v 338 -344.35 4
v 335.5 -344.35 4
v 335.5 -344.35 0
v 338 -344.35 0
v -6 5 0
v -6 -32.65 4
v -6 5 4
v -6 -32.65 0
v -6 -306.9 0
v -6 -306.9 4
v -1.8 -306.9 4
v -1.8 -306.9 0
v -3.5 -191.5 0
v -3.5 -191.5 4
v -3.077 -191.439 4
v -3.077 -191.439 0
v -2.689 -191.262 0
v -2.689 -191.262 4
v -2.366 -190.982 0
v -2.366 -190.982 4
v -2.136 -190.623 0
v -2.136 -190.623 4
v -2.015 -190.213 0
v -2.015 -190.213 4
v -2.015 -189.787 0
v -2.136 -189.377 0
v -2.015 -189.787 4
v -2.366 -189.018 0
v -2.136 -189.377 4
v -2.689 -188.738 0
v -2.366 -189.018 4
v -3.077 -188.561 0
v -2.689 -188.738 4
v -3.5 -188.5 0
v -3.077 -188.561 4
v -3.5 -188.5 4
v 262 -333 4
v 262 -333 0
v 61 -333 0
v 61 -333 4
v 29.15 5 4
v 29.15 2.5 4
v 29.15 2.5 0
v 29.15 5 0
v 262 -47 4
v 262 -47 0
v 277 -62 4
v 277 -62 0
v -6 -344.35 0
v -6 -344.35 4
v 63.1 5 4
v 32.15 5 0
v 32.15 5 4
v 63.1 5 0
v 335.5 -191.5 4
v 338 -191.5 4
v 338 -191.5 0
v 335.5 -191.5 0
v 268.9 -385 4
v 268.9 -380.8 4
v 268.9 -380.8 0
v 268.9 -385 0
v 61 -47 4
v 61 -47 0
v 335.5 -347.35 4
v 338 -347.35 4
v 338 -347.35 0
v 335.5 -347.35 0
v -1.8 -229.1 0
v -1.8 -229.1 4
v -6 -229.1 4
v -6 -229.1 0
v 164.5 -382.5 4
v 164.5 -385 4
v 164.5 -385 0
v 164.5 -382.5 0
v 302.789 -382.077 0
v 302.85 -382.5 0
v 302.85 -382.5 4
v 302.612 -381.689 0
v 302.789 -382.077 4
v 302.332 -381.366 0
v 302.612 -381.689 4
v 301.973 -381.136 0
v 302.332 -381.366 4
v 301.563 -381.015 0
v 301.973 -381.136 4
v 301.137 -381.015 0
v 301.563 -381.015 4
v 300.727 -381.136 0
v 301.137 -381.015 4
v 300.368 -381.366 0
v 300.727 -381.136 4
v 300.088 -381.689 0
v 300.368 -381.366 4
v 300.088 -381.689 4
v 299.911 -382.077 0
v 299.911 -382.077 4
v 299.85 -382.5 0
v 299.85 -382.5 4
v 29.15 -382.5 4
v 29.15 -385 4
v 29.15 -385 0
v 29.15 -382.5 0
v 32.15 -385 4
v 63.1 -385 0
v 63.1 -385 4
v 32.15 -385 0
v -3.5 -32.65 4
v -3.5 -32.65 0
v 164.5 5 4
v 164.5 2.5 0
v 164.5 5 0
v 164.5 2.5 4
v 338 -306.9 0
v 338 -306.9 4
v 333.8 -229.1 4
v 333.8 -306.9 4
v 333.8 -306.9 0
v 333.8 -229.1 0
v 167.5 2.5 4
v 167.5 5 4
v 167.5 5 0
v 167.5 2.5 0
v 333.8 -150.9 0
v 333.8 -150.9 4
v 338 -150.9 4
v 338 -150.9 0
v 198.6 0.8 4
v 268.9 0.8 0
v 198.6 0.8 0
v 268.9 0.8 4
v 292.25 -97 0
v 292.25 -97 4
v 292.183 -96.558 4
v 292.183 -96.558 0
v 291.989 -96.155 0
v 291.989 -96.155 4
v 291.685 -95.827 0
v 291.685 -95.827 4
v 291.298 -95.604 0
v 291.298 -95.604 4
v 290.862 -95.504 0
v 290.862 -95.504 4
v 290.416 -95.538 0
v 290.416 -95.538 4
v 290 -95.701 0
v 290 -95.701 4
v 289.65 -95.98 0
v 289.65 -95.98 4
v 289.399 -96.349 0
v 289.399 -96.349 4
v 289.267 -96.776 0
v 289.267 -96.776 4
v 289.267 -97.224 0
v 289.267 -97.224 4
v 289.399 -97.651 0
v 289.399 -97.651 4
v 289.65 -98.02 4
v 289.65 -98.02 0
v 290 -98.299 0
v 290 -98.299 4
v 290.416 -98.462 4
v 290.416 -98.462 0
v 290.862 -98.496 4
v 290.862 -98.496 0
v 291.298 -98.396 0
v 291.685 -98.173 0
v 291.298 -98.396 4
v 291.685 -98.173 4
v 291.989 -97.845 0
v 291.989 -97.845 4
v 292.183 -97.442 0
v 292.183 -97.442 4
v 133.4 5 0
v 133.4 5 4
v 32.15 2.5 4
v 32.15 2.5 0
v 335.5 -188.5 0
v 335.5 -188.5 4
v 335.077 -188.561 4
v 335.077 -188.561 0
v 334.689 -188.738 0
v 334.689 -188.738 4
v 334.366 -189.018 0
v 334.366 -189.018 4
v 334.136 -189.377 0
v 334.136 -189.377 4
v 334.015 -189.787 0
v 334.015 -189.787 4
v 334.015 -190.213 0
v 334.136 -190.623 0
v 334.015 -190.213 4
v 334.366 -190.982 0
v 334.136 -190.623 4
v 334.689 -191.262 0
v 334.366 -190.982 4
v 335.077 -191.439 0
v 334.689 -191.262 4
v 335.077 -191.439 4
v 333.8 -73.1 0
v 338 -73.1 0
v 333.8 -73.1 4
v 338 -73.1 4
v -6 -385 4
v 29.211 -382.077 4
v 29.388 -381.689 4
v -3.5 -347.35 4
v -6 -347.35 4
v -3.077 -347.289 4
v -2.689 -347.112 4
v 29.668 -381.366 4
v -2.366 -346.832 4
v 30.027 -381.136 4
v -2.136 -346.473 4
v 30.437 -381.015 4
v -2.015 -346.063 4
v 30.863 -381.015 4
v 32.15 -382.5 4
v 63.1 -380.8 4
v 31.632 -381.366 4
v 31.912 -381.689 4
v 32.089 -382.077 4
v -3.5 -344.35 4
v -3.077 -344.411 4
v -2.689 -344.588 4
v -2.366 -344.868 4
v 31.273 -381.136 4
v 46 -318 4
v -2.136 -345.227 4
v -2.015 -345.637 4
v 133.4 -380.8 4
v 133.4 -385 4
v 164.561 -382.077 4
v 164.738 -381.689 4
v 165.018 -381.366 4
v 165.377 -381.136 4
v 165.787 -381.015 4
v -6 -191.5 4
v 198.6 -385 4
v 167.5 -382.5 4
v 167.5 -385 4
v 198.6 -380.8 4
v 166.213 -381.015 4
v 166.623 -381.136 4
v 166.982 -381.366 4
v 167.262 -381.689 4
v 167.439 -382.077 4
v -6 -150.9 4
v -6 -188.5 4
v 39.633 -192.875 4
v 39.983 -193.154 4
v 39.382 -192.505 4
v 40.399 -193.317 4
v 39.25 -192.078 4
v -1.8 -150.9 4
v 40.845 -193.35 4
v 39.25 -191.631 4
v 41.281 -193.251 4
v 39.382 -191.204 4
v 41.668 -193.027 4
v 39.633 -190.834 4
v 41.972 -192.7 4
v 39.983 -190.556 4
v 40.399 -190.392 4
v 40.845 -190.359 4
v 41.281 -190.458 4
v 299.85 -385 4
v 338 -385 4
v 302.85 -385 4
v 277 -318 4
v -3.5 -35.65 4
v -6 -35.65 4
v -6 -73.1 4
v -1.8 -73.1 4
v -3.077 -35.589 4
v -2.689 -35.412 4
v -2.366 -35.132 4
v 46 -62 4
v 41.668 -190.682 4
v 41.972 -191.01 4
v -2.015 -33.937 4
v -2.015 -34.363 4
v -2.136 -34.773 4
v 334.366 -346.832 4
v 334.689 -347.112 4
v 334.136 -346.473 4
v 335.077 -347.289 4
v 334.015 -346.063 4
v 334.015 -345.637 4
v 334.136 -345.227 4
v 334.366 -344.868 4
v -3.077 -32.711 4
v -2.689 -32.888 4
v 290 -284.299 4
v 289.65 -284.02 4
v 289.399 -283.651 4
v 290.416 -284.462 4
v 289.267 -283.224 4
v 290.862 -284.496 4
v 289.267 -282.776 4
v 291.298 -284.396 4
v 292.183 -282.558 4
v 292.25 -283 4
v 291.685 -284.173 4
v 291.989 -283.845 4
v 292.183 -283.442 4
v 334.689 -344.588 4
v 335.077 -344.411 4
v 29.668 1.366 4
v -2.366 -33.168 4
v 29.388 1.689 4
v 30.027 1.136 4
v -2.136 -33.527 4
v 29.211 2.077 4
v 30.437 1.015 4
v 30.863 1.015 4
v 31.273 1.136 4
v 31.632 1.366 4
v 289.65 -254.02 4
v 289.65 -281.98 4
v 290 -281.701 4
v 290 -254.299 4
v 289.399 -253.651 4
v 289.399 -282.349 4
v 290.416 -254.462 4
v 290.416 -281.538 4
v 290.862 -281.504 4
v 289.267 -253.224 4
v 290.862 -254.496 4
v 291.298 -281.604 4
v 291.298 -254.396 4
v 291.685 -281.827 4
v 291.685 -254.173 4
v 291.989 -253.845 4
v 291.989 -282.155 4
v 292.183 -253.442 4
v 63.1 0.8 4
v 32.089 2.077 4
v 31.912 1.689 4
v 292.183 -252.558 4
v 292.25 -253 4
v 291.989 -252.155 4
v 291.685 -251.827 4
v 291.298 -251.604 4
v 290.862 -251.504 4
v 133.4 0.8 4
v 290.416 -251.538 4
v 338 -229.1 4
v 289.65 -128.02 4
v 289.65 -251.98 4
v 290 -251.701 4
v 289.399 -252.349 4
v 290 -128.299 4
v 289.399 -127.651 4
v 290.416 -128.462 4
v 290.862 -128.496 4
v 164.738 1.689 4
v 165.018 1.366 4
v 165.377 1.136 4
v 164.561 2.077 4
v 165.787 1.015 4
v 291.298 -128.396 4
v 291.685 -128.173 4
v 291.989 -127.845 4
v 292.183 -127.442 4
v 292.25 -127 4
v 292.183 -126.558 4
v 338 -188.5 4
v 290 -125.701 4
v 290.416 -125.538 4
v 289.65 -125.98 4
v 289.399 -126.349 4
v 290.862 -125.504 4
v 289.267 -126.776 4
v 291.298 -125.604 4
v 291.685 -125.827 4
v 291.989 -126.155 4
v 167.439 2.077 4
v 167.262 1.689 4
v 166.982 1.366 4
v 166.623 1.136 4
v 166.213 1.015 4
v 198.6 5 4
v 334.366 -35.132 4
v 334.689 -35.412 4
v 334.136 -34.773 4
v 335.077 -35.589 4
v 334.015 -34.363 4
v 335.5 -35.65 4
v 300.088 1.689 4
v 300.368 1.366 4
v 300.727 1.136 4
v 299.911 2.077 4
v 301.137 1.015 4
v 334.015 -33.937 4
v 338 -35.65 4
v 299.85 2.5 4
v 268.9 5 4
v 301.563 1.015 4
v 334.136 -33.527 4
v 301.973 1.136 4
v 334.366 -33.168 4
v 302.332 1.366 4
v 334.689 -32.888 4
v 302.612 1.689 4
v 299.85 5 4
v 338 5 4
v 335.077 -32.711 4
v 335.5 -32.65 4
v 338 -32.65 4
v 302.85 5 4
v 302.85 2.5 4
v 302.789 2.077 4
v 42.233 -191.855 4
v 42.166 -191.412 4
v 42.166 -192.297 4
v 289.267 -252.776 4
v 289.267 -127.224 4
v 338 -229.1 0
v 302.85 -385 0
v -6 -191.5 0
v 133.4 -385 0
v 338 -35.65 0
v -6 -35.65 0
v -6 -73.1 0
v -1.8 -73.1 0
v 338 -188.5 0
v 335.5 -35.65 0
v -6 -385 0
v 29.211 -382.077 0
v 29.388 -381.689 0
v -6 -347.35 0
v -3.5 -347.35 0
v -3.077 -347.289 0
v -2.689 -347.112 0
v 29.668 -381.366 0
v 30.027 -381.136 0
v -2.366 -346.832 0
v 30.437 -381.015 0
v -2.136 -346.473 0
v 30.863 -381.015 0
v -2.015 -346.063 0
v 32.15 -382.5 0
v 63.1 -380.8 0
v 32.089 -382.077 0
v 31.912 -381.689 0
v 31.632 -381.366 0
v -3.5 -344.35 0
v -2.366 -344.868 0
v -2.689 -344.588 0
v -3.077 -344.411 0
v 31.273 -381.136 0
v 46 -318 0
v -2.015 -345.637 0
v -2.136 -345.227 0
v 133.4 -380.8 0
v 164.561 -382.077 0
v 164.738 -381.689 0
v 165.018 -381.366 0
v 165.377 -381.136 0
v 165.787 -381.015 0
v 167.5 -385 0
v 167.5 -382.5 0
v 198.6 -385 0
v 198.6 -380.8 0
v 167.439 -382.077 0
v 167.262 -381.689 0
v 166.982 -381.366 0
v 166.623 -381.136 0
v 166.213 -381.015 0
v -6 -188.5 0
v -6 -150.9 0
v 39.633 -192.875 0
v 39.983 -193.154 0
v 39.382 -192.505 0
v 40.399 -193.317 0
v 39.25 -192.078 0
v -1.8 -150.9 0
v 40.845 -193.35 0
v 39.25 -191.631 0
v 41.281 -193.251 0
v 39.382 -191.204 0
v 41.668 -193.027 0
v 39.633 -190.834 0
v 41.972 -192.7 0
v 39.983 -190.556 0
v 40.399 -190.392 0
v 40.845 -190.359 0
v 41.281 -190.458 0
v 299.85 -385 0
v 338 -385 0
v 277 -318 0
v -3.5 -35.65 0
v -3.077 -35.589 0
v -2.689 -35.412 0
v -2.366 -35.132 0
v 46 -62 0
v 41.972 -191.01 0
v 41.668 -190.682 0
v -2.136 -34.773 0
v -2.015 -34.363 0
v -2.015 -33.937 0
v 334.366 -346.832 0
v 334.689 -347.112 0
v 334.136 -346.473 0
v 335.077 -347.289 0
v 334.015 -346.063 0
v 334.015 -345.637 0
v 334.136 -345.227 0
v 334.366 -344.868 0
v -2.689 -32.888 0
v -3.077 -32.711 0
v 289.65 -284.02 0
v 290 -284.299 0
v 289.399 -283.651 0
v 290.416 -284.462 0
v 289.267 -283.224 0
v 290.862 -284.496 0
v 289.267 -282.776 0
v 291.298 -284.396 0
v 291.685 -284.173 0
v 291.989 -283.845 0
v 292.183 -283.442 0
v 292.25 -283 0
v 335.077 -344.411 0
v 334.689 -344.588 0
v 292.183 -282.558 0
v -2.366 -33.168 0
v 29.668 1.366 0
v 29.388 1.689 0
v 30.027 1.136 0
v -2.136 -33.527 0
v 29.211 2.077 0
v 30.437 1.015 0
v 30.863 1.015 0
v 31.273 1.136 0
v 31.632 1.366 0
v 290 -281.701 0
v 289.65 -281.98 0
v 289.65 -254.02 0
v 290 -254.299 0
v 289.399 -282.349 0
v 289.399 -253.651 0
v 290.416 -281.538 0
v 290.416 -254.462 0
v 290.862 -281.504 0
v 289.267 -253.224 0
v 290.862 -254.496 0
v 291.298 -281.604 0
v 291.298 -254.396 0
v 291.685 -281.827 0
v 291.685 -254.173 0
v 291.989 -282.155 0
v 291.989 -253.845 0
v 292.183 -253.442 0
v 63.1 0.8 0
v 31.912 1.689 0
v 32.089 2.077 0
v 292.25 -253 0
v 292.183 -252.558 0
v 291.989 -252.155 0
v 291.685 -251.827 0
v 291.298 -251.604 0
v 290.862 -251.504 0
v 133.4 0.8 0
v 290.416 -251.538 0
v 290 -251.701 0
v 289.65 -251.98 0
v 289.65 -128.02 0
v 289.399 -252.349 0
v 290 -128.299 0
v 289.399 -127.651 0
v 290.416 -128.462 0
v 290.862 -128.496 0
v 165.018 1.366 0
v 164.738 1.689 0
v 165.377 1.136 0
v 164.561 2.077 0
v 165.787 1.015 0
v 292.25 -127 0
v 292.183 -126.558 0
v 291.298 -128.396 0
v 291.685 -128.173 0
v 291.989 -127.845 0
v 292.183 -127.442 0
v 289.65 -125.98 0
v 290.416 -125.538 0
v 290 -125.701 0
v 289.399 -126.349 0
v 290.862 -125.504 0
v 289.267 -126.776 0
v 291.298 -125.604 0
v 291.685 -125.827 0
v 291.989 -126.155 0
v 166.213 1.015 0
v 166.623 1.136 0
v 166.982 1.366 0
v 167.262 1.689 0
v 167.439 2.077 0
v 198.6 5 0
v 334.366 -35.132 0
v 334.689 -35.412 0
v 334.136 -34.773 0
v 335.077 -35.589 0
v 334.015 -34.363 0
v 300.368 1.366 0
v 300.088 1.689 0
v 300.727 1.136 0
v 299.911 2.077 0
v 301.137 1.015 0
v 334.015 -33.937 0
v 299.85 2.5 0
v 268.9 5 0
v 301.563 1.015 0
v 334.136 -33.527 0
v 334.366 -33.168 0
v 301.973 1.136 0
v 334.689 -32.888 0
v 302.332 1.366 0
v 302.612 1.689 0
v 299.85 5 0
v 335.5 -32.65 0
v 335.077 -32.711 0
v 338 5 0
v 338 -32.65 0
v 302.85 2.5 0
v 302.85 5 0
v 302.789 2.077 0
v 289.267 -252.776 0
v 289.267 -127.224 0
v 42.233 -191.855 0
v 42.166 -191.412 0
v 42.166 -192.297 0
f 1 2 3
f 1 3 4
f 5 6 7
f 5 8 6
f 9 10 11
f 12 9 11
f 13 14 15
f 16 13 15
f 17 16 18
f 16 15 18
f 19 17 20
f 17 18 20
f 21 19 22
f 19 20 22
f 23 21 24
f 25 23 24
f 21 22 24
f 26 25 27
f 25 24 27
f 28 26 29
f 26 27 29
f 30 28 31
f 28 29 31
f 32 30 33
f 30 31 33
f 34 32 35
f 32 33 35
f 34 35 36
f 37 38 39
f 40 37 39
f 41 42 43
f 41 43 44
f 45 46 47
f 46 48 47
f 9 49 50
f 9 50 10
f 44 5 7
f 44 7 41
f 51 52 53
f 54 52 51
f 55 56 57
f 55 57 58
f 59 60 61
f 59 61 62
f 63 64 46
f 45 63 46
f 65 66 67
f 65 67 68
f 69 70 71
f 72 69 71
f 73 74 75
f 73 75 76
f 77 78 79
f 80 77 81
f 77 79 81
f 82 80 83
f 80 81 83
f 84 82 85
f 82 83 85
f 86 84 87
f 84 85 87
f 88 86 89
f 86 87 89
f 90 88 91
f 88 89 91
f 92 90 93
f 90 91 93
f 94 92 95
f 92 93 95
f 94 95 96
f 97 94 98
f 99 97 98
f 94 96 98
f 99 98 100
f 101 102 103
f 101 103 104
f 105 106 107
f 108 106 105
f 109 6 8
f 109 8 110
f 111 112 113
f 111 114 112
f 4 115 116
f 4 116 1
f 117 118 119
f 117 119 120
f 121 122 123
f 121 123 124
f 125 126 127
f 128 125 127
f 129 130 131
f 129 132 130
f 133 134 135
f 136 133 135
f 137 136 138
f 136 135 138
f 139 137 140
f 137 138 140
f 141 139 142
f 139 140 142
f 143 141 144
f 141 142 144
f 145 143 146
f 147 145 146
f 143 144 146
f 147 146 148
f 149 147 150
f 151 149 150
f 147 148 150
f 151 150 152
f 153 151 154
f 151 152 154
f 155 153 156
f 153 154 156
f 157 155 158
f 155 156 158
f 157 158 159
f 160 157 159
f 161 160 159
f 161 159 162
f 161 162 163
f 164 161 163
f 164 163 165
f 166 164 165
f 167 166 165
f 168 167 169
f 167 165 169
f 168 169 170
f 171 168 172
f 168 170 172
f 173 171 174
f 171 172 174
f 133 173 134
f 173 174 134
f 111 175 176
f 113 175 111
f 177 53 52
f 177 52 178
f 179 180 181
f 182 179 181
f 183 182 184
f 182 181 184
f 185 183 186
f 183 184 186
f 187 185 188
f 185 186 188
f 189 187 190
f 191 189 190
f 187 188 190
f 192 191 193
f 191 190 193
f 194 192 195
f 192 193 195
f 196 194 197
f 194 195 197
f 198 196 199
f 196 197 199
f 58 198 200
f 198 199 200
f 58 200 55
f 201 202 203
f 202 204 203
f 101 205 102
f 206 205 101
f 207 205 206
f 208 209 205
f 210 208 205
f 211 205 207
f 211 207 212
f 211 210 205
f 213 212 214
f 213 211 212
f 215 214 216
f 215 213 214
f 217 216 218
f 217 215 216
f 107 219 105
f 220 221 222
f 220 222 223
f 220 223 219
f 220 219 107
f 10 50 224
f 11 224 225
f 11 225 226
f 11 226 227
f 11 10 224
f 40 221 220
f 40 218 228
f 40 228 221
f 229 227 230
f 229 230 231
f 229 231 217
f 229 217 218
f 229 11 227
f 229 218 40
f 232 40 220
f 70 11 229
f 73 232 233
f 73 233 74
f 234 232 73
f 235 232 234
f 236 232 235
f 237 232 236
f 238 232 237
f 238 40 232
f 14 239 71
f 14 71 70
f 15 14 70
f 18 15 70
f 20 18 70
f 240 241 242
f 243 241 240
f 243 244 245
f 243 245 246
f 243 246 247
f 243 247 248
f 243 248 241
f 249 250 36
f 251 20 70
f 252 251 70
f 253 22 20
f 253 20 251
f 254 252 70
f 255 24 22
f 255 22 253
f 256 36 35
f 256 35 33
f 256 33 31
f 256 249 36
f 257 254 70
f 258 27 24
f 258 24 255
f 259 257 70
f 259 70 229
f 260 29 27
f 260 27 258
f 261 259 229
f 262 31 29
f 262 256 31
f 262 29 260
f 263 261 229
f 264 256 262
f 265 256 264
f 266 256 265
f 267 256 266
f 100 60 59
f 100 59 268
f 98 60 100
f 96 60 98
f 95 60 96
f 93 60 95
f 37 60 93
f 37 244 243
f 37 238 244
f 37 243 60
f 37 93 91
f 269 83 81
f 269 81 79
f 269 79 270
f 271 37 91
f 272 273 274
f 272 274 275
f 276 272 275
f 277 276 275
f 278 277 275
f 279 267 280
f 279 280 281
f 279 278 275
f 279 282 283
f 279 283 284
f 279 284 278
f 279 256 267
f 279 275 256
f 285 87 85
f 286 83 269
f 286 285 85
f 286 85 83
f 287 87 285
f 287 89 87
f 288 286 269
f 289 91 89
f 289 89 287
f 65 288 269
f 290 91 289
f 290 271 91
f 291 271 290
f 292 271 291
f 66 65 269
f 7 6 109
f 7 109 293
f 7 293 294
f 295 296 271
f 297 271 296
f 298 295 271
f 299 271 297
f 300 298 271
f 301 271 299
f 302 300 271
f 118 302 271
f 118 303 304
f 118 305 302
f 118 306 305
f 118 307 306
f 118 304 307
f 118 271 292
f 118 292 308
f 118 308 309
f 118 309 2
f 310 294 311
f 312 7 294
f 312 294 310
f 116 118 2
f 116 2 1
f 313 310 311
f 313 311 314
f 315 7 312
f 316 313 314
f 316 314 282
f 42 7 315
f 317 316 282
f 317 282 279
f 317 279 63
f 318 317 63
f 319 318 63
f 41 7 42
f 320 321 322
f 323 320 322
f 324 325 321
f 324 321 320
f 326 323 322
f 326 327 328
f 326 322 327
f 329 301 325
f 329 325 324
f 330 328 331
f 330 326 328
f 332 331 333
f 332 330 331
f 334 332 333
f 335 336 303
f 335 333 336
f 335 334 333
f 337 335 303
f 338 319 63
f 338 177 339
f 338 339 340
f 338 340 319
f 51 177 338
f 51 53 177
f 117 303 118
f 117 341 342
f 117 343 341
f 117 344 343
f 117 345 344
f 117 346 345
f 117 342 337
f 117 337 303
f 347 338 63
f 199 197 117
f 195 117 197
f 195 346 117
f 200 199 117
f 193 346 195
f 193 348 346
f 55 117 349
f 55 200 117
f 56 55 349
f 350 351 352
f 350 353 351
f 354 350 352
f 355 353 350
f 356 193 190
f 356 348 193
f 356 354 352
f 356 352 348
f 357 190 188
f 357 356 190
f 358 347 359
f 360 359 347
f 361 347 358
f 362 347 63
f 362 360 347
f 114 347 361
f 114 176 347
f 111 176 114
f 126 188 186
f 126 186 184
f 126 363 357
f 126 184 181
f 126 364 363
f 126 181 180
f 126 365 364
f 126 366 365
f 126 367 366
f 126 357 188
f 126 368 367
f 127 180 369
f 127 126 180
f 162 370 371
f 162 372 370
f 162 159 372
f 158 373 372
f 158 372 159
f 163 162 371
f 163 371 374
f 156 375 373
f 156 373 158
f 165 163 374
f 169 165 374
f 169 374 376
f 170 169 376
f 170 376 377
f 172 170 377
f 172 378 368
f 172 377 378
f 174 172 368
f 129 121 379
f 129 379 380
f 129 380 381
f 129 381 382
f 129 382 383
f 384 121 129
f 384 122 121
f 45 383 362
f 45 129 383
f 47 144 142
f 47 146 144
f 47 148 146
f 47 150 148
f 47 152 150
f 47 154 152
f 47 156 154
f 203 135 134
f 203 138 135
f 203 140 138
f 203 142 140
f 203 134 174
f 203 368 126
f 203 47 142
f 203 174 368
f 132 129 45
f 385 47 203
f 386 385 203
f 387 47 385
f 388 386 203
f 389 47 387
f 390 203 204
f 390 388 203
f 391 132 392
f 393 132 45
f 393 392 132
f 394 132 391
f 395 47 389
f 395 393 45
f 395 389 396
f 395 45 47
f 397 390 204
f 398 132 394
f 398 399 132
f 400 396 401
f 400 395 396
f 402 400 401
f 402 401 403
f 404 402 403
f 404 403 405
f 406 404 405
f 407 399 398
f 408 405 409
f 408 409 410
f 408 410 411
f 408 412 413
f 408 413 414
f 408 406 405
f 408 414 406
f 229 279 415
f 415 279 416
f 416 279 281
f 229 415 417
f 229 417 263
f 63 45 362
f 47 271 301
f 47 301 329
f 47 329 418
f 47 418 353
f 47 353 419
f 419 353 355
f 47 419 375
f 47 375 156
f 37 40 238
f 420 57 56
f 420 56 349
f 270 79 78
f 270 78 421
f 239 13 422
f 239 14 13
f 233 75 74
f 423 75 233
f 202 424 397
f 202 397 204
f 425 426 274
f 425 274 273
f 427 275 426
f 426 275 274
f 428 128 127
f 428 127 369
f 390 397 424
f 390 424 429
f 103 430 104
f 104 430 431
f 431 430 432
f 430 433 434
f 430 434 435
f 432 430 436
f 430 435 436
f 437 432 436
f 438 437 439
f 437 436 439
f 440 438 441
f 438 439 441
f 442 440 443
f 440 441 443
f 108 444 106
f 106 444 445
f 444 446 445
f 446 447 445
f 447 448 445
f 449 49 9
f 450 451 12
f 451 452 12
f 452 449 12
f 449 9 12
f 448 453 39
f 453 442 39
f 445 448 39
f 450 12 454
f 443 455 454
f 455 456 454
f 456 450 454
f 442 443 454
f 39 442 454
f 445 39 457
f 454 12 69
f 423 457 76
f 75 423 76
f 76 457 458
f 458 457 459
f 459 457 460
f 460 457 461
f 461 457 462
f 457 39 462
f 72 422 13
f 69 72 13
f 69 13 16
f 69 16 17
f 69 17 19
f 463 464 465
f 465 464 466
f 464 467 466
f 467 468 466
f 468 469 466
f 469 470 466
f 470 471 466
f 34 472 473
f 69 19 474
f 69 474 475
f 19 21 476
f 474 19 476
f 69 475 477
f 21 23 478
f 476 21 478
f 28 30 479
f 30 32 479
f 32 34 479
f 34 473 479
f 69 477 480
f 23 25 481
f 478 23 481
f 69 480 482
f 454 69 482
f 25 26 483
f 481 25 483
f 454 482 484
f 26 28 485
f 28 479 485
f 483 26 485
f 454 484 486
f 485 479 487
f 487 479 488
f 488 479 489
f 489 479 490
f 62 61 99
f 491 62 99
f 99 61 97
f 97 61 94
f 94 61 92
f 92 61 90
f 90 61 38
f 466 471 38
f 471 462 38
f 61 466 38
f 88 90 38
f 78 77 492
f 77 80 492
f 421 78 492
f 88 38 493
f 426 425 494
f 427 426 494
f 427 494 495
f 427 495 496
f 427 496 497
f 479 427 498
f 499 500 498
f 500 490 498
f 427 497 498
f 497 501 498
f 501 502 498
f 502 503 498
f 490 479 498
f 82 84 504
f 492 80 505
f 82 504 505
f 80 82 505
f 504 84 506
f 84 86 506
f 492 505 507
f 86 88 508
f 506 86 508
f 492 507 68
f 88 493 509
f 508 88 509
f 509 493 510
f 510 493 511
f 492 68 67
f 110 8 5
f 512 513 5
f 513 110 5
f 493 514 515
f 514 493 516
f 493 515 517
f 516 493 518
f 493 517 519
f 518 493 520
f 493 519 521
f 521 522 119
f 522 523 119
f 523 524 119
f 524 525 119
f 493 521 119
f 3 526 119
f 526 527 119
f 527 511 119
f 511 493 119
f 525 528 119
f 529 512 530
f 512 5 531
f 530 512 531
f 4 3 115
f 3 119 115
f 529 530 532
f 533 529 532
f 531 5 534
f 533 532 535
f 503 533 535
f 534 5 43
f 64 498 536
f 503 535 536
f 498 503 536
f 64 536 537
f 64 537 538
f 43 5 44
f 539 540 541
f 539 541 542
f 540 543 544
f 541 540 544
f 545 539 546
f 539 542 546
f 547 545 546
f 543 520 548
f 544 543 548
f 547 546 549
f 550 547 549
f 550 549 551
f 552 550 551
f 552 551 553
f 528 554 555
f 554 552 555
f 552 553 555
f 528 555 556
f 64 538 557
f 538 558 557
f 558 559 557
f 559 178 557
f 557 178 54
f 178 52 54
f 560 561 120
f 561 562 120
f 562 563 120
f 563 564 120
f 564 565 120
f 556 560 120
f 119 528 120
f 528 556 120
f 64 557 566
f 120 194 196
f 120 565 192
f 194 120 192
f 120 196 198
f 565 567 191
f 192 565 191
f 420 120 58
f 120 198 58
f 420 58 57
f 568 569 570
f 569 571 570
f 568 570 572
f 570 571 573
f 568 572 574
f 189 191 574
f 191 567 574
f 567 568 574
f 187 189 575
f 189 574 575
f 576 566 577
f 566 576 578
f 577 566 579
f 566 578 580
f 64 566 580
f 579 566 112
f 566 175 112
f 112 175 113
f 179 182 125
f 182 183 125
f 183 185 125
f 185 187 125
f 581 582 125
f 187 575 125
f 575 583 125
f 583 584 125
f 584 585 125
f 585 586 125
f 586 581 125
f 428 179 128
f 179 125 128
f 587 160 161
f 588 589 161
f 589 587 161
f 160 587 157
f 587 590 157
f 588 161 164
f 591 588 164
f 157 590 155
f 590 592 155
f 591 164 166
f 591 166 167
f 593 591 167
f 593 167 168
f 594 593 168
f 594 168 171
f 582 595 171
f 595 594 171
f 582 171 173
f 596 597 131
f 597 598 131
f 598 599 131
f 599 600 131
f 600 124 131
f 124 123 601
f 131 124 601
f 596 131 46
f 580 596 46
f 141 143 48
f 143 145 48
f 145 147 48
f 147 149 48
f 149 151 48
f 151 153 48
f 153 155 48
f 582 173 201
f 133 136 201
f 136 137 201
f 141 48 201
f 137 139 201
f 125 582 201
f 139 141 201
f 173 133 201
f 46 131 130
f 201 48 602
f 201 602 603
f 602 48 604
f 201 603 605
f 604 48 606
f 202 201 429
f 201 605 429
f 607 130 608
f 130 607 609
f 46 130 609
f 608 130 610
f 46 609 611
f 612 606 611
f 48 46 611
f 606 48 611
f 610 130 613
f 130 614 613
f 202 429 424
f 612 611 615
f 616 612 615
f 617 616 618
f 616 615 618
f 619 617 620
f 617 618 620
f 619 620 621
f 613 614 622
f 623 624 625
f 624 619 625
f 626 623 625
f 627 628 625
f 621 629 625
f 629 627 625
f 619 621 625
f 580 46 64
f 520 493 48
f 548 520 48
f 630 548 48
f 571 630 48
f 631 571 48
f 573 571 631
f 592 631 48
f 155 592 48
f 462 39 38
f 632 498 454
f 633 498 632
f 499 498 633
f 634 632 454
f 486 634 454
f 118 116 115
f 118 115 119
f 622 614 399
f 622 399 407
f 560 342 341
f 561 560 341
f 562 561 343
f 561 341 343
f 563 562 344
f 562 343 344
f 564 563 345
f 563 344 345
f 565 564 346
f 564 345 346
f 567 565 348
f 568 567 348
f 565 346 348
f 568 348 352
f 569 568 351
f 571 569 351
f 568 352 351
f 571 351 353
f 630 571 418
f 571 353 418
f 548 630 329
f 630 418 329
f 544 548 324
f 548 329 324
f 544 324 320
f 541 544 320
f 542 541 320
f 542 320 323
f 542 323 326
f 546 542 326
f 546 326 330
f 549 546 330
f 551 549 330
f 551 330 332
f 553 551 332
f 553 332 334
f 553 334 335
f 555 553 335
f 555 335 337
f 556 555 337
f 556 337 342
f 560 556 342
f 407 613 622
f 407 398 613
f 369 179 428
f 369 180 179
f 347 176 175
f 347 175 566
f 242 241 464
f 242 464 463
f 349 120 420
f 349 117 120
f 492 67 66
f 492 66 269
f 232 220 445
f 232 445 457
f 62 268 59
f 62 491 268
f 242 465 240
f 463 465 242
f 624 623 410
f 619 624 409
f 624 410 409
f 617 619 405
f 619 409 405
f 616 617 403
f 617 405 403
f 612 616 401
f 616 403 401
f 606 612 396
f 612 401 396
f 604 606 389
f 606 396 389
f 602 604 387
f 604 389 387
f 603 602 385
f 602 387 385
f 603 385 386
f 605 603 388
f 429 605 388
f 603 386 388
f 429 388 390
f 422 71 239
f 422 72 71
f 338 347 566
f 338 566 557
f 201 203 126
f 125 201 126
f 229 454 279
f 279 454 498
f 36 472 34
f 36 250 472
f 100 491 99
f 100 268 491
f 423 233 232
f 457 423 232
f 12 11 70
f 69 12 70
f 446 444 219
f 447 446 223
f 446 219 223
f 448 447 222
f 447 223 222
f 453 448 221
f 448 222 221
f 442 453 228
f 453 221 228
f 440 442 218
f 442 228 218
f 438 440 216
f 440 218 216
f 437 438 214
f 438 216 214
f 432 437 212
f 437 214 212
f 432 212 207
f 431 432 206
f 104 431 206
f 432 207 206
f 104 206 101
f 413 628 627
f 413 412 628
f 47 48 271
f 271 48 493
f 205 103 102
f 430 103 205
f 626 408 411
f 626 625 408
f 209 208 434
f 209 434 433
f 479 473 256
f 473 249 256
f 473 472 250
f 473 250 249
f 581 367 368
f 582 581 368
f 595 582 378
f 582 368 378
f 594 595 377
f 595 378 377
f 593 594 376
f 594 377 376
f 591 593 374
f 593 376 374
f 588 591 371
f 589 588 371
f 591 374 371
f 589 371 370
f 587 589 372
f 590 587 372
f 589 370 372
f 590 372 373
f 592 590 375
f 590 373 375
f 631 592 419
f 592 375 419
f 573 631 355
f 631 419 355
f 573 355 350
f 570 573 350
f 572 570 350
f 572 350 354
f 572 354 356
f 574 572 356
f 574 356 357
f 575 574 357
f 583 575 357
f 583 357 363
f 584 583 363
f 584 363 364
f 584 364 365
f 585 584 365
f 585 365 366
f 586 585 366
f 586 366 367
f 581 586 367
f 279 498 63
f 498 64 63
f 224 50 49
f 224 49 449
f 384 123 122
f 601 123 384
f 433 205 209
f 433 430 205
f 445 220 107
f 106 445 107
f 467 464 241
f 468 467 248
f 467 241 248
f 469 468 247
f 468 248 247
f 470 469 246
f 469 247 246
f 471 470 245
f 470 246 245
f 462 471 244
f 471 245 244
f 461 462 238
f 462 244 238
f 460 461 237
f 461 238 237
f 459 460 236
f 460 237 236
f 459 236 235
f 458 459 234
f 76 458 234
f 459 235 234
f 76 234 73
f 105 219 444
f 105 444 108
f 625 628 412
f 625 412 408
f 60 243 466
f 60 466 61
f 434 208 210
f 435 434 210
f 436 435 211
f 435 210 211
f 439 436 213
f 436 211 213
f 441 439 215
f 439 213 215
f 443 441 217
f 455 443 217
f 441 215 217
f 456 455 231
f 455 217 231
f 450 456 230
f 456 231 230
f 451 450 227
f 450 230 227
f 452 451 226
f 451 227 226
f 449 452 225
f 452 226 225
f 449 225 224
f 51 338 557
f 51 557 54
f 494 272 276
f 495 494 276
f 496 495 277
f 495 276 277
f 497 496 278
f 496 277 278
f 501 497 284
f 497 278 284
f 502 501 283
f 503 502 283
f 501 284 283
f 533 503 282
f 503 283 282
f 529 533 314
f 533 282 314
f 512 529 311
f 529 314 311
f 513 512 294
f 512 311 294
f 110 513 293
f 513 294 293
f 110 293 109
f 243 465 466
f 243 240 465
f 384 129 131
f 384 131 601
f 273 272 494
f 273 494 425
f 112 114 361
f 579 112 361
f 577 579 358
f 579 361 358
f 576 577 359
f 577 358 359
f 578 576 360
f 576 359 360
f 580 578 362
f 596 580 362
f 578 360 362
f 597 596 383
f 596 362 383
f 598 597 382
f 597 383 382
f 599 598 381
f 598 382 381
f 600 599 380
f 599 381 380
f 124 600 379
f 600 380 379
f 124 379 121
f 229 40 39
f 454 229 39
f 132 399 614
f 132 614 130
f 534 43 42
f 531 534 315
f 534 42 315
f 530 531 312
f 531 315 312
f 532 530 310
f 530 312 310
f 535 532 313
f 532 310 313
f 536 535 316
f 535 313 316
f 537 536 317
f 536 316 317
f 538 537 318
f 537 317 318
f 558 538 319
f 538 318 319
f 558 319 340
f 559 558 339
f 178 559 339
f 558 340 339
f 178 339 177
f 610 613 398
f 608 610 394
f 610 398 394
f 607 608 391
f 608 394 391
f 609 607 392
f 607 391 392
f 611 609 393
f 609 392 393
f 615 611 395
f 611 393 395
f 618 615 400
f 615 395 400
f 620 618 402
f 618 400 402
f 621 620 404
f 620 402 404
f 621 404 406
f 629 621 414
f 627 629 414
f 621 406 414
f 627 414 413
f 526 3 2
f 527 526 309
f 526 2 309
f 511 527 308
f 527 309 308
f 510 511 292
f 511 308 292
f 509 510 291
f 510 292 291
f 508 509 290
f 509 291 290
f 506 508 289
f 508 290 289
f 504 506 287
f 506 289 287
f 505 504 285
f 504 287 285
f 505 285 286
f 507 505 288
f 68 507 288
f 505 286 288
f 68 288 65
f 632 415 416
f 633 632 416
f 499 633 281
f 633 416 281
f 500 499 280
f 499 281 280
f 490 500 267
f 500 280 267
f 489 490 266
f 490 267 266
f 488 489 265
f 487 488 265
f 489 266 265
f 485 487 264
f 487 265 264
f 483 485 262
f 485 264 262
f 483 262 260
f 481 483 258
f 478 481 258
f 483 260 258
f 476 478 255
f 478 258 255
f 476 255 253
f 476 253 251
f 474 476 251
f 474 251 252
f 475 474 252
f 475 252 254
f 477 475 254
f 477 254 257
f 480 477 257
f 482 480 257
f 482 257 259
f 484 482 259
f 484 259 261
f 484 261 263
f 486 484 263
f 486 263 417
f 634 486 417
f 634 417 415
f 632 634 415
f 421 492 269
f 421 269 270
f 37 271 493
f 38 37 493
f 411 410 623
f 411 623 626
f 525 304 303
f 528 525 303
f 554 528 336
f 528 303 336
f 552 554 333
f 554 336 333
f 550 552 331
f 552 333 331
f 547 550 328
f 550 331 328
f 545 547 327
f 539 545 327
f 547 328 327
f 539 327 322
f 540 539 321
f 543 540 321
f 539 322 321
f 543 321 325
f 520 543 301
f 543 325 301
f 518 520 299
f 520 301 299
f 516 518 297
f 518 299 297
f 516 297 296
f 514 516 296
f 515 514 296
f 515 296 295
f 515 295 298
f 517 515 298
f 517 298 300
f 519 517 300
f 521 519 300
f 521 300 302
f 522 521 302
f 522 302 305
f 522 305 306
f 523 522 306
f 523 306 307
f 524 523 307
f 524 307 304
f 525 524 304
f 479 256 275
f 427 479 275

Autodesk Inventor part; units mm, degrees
ref_plane "YZ Plane" through (0, 0, 0) normal (1, 0, 0) x (0, 1, 0)
ref_plane "XZ Plane" through (0, 0, 0) normal (0, 1, 0) x (-1, 0, 0)
ref_plane "XY Plane" through (0, 0, 0) normal (0, 0, 1) x (1, 0, 0)
sketch "Эскиз1" plane through (0, 0, 0) normal (0, 0, 1) x (1, 0, 0)
  line L0 (46, -47) -> (277, -47)
  line L1 (277, -47) -> (277, -333)
  line L2 (277, -333) -> (46, -333)
  line L3 (46, -333) -> (46, -47)
  line L4 (-2, 5) -> (334, 5) projected
  line L5 (338, 5) -> (338, -385) projected
  line L6 (334, -385) -> (-2, -385) projected
  line L7 (-6, -385) -> (-6, 5) projected
  line L8 (-6, 5) -> (338, 5)
  line L9 (338, 5) -> (338, -385)
  line L10 (338, -385) -> (-6, -385)
  line L11 (-6, -385) -> (-6, 5)
  dimension "d4" = 231
  dimension "d10" = 61
  dimension "d11" = 52
  dimension "d12" = 52
  dimension "d13" = 52
extrude "Выдавливание3" add sketch "Эскиз1" along normal blind 4
sketch "Эскиз3" plane through (0, 0, 4) normal (0, 0, 1) x (1, 0, 0)
  circle A0 centre (290.75, -97) radius 1.5
  circle A1 centre (290.75, -127) radius 1.5
  line L0 (46, -47) -> (277, -47) projected
  line L1 (277, -47) -> (277, -333) projected
  circle A2 centre (290.75, -253) radius 1.5
  circle A3 centre (290.75, -283) radius 1.5
  line L2 (277, -333) -> (46, -333) projected
  point P0 (0, 0)
  dimension "d19" = 3
  dimension "d20" = 3
  dimension "d21" = 30
  dimension "d22" = 50
  dimension "d23" = 13.75
  dimension "d24" = 13.75
  dimension "d25" = 3
  dimension "d26" = 3
  dimension "d27" = 30
  dimension "d28" = 13.75
  dimension "d29" = 13.75
  dimension "d30" = 50
extrude "Выдавливание4" cut sketch "Эскиз3" against normal blind 10
chamfer "Фаска1" distance 15 angle 45 4 edges at (277, -47, 2) (277, -333, 2) (46, -47, 2) (46, -333, 2)
sketch "Эскиз4" plane through (0, 0, 4) normal (0, 0, 1) x (1, 0, 0)
  ellipse E0 centre (40.9735, -191.8546) end of major axis (40.9735, -190.3546) minor radius 1.4997 projected
  line L0 (40.9735, -191.8546) -> (10.6659, -191.8546) construction
  circle A0 centre (40.733, -191.8546) radius 1.5
  line L1 (46, -62) -> (46, -318) projected
  point P0 (0, 0)
  dimension "d36" = 3
  dimension "d37" = 5.267
extrude "Выдавливание5" cut sketch "Эскиз4" against normal blind 10 contours A0 E0 | E0 A0 picked at (41.2979, -191.9775) picked at (39.4227, -191.6148)
sketch "Эскиз5" plane through (0, 0, 4) normal (0, 0, 1) x (1, 0, 0)
  line L0 (-6, -73.3) -> (-2, -73.3) projected
  line L1 (-6, -150.7) -> (-2, -150.7) projected
  line L2 (-2, -73.3) -> (-2, -150.7) projected
  line L3 (-6, 5) -> (-6, -385) projected
  line L4 (-6, -229.3) -> (-2, -229.3) projected
  line L5 (-2, -229.3) -> (-2, -306.7) projected
  line L6 (-6, -306.7) -> (-2, -306.7) projected
  line L7 (63.3, -385) -> (63.3, -381) projected
  line L8 (133.2, -385) -> (63.3, -385) projected
  line L9 (133.2, -385) -> (133.2, -381) projected
  line L10 (63.3, -381) -> (133.2, -381) projected
  line L11 (63.3, -385) -> (63.3, -381) projected
  line L12 (268.7, -385) -> (198.8, -385) projected
  line L13 (268.7, -385) -> (268.7, -381) projected
  line L14 (198.8, -381) -> (268.7, -381) projected
  line L15 (198.8, -385) -> (198.8, -381) projected
  line L16 (63.3, 5) -> (133.2, 5) projected
  line L17 (63.3, 5) -> (63.3, 1) projected
  line L18 (133.2, 1) -> (63.3, 1) projected
  line L19 (133.2, 5) -> (133.2, 1) projected
  line L20 (198.8, 5) -> (268.7, 5) projected
  line L21 (198.8, 5) -> (198.8, 1) projected
  line L22 (268.7, 1) -> (198.8, 1) projected
  line L23 (268.7, 5) -> (268.7, 1) projected
  line L24 (338, -229.3) -> (334, -229.3) projected
  line L25 (334, -306.7) -> (334, -229.3) projected
  line L26 (338, -306.7) -> (334, -306.7) projected
  line L27 (338, -229.3) -> (338, -306.7) projected
  line L28 (338, -150.7) -> (334, -150.7) projected
  line L29 (338, -73.3) -> (338, -150.7) projected
  line L30 (334, -150.7) -> (334, -73.3) projected
  line L31 (338, -73.3) -> (334, -73.3) projected
  line L32 (63.1, 0.8) -> (63.1, 5.2)
  line L33 (63.1, 5.2) -> (133.4, 5.2)
  line L34 (133.4, 5.2) -> (133.4, 0.8)
  line L35 (133.4, 0.8) -> (63.1, 0.8)
  line L36 (198.6, 0.8) -> (198.6, 5.2)
  line L37 (198.6, 5.2) -> (268.9, 5.2)
  line L38 (268.9, 5.2) -> (268.9, 0.8)
  line L39 (268.9, 0.8) -> (198.6, 0.8)
  line L40 (333.8, -73.1) -> (333.8, -150.9)
  line L41 (333.8, -150.9) -> (338.2, -150.9)
  line L42 (338.2, -150.9) -> (338.2, -73.1)
  line L43 (338.2, -73.1) -> (333.8, -73.1)
  line L44 (333.8, -229.1) -> (338.2, -229.1)
  line L45 (338.2, -229.1) -> (338.2, -306.9)
  line L46 (338.2, -306.9) -> (333.8, -306.9)
  line L47 (333.8, -306.9) -> (333.8, -229.1)
  line L48 (268.9, -380.8) -> (268.9, -385.2)
  line L49 (268.9, -385.2) -> (198.6, -385.2)
  line L50 (198.6, -385.2) -> (198.6, -380.8)
  line L51 (198.6, -380.8) -> (268.9, -380.8)
  line L52 (133.2, -385) -> (63.3, -385) projected
  line L53 (133.2, -385) -> (133.2, -381) projected
  line L54 (63.3, -381) -> (133.2, -381) projected
  line L55 (63.3, -385) -> (63.3, -381) projected
  line L56 (63.3, -385) -> (63.3, -381) projected
  line L57 (63.3, -381) -> (133.2, -381) projected
  line L58 (-6, -306.9) -> (-1.8, -306.9)
  line L59 (-1.8, -306.9) -> (-1.8, -229.1)
  line L60 (-1.8, -229.1) -> (-6, -229.1)
  line L61 (-6, -150.9) -> (-1.8, -150.9)
  line L62 (-1.8, -150.9) -> (-1.8, -73.1)
  line L63 (-1.8, -73.1) -> (-6, -73.1)
  line L64 (-6, -73.1) -> (-6, -150.9)
  line L65 (-6, -229.1) -> (-6, -306.9)
  line L66 (63.3, -381) -> (133.2, -381)
  line L67 (133.2, -381) -> (133.2, -385)
  line L68 (133.2, -385) -> (63.3, -385)
  line L69 (63.3, -385) -> (63.3, -381)
  line L70 (63.3, -380.8) -> (133.2, -380.8)
  line L71 (63.1, -385) -> (63.1, -381)
  line L72 (133.4, -385) -> (133.4, -381)
  line L73 (133.4, -380.8) -> (63.1, -380.8)
  line L74 (63.1, -380.8) -> (63.1, -385.2)
  line L75 (63.1, -385.2) -> (133.4, -385.2)
  line L76 (133.4, -385.2) -> (133.4, -380.8)
  point P0 (0, 0)
  dimension "d40" = 4
  dimension "d41" = 69.9
  dimension "d42" = 69.9
  dimension "d43" = 0.2
  dimension "d44" = 0.2
  dimension "d45" = 0.2
  dimension "d46" = 0.2
  dimension "d47" = 0.2
  dimension "d48" = 0.2
  dimension "d49" = 0.2
  dimension "d50" = 0.2
  dimension "d51" = 0.2
  dimension "d52" = 0.2
extrude "Выдавливание6" cut sketch "Эскиз5" against normal blind 4.2 contours L3 L63 L62 L61 L1 L2 L0 | L60 L59 L58 L3 L6 L5 L4 | L0 L2 L1 L3 | L4 L5 L6 L3 | L7 L10 L9 L8 | L12 L15 L14 L13 | L16 L19 L18 L17 | L20 L23 L22 L21 | L27 L26 L25 L24 | L28 L30 L31 L29 | L32 L33 L34 L35 | L36 L37 L38 L39 | L43 L42 L41 L40 | L44 L45 L46 L47 | L48 L49 L50 L51 | L70 L73 L76 L72 L75 L74 L71
sketch "Эскиз6" plane through (0, 0, 4) normal (0, 0, 1) x (1, 0, 0)
  line L0 (302.85, -381) -> (302.85, -385) projected
  line L1 (299.85, -385) -> (299.85, -381) projected
  line L2 (167.5, -381) -> (167.5, -385) projected
  line L3 (164.5, -385) -> (164.5, -381) projected
  line L4 (32.15, -381) -> (32.15, -385) projected
  line L5 (29.15, -385) -> (29.15, -381) projected
  line L6 (301.35, -381) -> (301.35, -381)
  line L7 (166, -381) -> (166, -381)
  line L8 (30.65, -381) -> (30.65, -381)
  line L9 (63.1, -380.8) -> (133.4, -380.8) projected
  line L10 (302.85, -381) -> (299.85, -381)
  line L11 (299.85, -382.5) -> (299.85, -385)
  line L12 (299.85, -385) -> (302.85, -385)
  line L13 (302.85, -385) -> (302.85, -382.5)
  line L14 (167.5, -381) -> (164.5, -381)
  line L15 (164.5, -382.5) -> (164.5, -385)
  line L16 (164.5, -385) -> (167.5, -385)
  line L17 (167.5, -385) -> (167.5, -382.5)
  line L18 (32.15, -381) -> (29.15, -381)
  line L19 (29.15, -382.5) -> (29.15, -385)
  line L20 (29.15, -385) -> (32.15, -385)
  line L21 (32.15, -385) -> (32.15, -382.5)
  line L22 (334, -344.35) -> (338, -344.35) projected
  line L23 (338, -347.35) -> (334, -347.35) projected
  line L24 (334, -188.5) -> (338, -188.5) projected
  line L25 (338, -191.5) -> (334, -191.5) projected
  line L26 (334, -32.65) -> (338, -32.65) projected
  line L27 (338, -35.65) -> (334, -35.65) projected
  line L28 (302.85, 5) -> (302.85, 1) projected
  line L29 (299.85, 1) -> (299.85, 5) projected
  line L30 (167.5, 5) -> (167.5, 1) projected
  line L31 (164.5, 1) -> (164.5, 5) projected
  line L32 (32.15, 5) -> (32.15, 1) projected
  line L33 (29.15, 1) -> (29.15, 5) projected
  line L34 (-6, -32.65) -> (-2, -32.65) projected
  line L35 (-2, -35.65) -> (-6, -35.65) projected
  line L36 (-6, -188.5) -> (-2, -188.5) projected
  line L37 (-2, -191.5) -> (-6, -191.5) projected
  line L38 (-6, -344.35) -> (-2, -344.35) projected
  line L39 (-2, -347.35) -> (-6, -347.35) projected
  line L40 (338, -344.35) -> (335.5, -344.35)
  line L41 (334, -345.85) -> (334, -345.85)
  line L42 (335.5, -347.35) -> (338, -347.35)
  line L43 (338, -347.35) -> (338, -344.35)
  line L44 (338, -188.5) -> (335.5, -188.5)
  line L45 (334, -190) -> (334, -190)
  line L46 (335.5, -191.5) -> (338, -191.5)
  line L47 (338, -191.5) -> (338, -188.5)
  line L48 (338, -32.65) -> (335.5, -32.65)
  line L49 (334, -34.15) -> (334, -34.15)
  line L50 (335.5, -35.65) -> (338, -35.65)
  line L51 (338, -35.65) -> (338, -32.65)
  line L52 (302.85, 5) -> (299.85, 5)
  line L53 (299.85, 5) -> (299.85, 2.5)
  line L54 (301.35, 1) -> (301.35, 1)
  line L55 (302.85, 2.5) -> (302.85, 5)
  line L56 (167.5, 5) -> (164.5, 5)
  line L57 (164.5, 5) -> (164.5, 2.5)
  line L58 (166, 1) -> (166, 1)
  line L59 (167.5, 2.5) -> (167.5, 5)
  line L60 (32.15, 5) -> (29.15, 5)
  line L61 (29.15, 5) -> (29.15, 2.5)
  line L62 (30.65, 1) -> (30.65, 1)
  line L63 (32.15, 2.5) -> (32.15, 5)
  line L64 (-3.5, -32.65) -> (-6, -32.65)
  line L65 (-6, -32.65) -> (-6, -35.65)
  line L66 (-6, -35.65) -> (-3.5, -35.65)
  line L67 (-2, -34.15) -> (-2, -34.15)
  line L68 (-3.5, -188.5) -> (-6, -188.5)
  line L69 (-6, -188.5) -> (-6, -191.5)
  line L70 (-6, -191.5) -> (-3.5, -191.5)
  line L71 (-2, -190) -> (-2, -190)
  line L72 (-3.5, -344.35) -> (-6, -344.35)
  line L73 (-6, -344.35) -> (-6, -347.35)
  line L74 (-6, -347.35) -> (-3.5, -347.35)
  line L75 (-2, -345.85) -> (-2, -345.85)
  arc A0 (167.5, -382.5) -> (166, -381) centre (166, -382.5) ccw
  arc A1 (166, -381) -> (164.5, -382.5) centre (166, -382.5) ccw
  arc A2 (32.15, -382.5) -> (30.65, -381) centre (30.65, -382.5) ccw
  arc A3 (30.65, -381) -> (29.15, -382.5) centre (30.65, -382.5) ccw
  arc A4 (-2, -345.85) -> (-3.5, -344.35) centre (-3.5, -345.85) ccw
  arc A5 (-3.5, -347.35) -> (-2, -345.85) centre (-3.5, -345.85) ccw
  arc A6 (-2, -190) -> (-3.5, -188.5) centre (-3.5, -190) ccw
  arc A7 (-3.5, -191.5) -> (-2, -190) centre (-3.5, -190) ccw
  arc A8 (-2, -34.15) -> (-3.5, -32.65) centre (-3.5, -34.15) ccw
  arc A9 (-3.5, -35.65) -> (-2, -34.15) centre (-3.5, -34.15) ccw
  arc A10 (30.65, 1) -> (32.15, 2.5) centre (30.65, 2.5) ccw
  arc A11 (29.15, 2.5) -> (30.65, 1) centre (30.65, 2.5) ccw
  arc A12 (166, 1) -> (167.5, 2.5) centre (166, 2.5) ccw
  arc A13 (164.5, 2.5) -> (166, 1) centre (166, 2.5) ccw
  arc A14 (301.35, 1) -> (302.85, 2.5) centre (301.35, 2.5) ccw
  arc A15 (299.85, 2.5) -> (301.35, 1) centre (301.35, 2.5) ccw
  arc A16 (335.5, -32.65) -> (334, -34.15) centre (335.5, -34.15) ccw
  arc A17 (334, -34.15) -> (335.5, -35.65) centre (335.5, -34.15) ccw
  arc A18 (335.5, -188.5) -> (334, -190) centre (335.5, -190) ccw
  arc A19 (334, -190) -> (335.5, -191.5) centre (335.5, -190) ccw
  arc A20 (335.5, -344.35) -> (334, -345.85) centre (335.5, -345.85) ccw
  arc A21 (334, -345.85) -> (335.5, -347.35) centre (335.5, -345.85) ccw
  arc A22 (302.85, -382.5) -> (301.35, -381) centre (301.35, -382.5) ccw
  arc A23 (301.35, -381) -> (299.85, -382.5) centre (301.35, -382.5) ccw
  point P0 (0, 0)
  dimension "d55" = 1.5
  dimension "d56" = 1.5
extrude "Выдавливание7" cut sketch "Эскиз6" against normal blind 10 contours L0 L12 L1 A23 A22 | L2 L16 L3 A1 A0 | L4 L20 L5 A3 A2 | L22 L43 L23 A21 A20 | L24 L47 L25 A19 A18 | L26 L51 L27 A17 A16 | L28 A14 A15 L29 L52 | L30 A12 A13 L31 L56 | L32 A10 A11 L33 L60 | L34 A8 A9 L35 L65 | L36 A6 A7 L37 L69 | L38 A4 A5 L39 L73
properties part number "крышка"
